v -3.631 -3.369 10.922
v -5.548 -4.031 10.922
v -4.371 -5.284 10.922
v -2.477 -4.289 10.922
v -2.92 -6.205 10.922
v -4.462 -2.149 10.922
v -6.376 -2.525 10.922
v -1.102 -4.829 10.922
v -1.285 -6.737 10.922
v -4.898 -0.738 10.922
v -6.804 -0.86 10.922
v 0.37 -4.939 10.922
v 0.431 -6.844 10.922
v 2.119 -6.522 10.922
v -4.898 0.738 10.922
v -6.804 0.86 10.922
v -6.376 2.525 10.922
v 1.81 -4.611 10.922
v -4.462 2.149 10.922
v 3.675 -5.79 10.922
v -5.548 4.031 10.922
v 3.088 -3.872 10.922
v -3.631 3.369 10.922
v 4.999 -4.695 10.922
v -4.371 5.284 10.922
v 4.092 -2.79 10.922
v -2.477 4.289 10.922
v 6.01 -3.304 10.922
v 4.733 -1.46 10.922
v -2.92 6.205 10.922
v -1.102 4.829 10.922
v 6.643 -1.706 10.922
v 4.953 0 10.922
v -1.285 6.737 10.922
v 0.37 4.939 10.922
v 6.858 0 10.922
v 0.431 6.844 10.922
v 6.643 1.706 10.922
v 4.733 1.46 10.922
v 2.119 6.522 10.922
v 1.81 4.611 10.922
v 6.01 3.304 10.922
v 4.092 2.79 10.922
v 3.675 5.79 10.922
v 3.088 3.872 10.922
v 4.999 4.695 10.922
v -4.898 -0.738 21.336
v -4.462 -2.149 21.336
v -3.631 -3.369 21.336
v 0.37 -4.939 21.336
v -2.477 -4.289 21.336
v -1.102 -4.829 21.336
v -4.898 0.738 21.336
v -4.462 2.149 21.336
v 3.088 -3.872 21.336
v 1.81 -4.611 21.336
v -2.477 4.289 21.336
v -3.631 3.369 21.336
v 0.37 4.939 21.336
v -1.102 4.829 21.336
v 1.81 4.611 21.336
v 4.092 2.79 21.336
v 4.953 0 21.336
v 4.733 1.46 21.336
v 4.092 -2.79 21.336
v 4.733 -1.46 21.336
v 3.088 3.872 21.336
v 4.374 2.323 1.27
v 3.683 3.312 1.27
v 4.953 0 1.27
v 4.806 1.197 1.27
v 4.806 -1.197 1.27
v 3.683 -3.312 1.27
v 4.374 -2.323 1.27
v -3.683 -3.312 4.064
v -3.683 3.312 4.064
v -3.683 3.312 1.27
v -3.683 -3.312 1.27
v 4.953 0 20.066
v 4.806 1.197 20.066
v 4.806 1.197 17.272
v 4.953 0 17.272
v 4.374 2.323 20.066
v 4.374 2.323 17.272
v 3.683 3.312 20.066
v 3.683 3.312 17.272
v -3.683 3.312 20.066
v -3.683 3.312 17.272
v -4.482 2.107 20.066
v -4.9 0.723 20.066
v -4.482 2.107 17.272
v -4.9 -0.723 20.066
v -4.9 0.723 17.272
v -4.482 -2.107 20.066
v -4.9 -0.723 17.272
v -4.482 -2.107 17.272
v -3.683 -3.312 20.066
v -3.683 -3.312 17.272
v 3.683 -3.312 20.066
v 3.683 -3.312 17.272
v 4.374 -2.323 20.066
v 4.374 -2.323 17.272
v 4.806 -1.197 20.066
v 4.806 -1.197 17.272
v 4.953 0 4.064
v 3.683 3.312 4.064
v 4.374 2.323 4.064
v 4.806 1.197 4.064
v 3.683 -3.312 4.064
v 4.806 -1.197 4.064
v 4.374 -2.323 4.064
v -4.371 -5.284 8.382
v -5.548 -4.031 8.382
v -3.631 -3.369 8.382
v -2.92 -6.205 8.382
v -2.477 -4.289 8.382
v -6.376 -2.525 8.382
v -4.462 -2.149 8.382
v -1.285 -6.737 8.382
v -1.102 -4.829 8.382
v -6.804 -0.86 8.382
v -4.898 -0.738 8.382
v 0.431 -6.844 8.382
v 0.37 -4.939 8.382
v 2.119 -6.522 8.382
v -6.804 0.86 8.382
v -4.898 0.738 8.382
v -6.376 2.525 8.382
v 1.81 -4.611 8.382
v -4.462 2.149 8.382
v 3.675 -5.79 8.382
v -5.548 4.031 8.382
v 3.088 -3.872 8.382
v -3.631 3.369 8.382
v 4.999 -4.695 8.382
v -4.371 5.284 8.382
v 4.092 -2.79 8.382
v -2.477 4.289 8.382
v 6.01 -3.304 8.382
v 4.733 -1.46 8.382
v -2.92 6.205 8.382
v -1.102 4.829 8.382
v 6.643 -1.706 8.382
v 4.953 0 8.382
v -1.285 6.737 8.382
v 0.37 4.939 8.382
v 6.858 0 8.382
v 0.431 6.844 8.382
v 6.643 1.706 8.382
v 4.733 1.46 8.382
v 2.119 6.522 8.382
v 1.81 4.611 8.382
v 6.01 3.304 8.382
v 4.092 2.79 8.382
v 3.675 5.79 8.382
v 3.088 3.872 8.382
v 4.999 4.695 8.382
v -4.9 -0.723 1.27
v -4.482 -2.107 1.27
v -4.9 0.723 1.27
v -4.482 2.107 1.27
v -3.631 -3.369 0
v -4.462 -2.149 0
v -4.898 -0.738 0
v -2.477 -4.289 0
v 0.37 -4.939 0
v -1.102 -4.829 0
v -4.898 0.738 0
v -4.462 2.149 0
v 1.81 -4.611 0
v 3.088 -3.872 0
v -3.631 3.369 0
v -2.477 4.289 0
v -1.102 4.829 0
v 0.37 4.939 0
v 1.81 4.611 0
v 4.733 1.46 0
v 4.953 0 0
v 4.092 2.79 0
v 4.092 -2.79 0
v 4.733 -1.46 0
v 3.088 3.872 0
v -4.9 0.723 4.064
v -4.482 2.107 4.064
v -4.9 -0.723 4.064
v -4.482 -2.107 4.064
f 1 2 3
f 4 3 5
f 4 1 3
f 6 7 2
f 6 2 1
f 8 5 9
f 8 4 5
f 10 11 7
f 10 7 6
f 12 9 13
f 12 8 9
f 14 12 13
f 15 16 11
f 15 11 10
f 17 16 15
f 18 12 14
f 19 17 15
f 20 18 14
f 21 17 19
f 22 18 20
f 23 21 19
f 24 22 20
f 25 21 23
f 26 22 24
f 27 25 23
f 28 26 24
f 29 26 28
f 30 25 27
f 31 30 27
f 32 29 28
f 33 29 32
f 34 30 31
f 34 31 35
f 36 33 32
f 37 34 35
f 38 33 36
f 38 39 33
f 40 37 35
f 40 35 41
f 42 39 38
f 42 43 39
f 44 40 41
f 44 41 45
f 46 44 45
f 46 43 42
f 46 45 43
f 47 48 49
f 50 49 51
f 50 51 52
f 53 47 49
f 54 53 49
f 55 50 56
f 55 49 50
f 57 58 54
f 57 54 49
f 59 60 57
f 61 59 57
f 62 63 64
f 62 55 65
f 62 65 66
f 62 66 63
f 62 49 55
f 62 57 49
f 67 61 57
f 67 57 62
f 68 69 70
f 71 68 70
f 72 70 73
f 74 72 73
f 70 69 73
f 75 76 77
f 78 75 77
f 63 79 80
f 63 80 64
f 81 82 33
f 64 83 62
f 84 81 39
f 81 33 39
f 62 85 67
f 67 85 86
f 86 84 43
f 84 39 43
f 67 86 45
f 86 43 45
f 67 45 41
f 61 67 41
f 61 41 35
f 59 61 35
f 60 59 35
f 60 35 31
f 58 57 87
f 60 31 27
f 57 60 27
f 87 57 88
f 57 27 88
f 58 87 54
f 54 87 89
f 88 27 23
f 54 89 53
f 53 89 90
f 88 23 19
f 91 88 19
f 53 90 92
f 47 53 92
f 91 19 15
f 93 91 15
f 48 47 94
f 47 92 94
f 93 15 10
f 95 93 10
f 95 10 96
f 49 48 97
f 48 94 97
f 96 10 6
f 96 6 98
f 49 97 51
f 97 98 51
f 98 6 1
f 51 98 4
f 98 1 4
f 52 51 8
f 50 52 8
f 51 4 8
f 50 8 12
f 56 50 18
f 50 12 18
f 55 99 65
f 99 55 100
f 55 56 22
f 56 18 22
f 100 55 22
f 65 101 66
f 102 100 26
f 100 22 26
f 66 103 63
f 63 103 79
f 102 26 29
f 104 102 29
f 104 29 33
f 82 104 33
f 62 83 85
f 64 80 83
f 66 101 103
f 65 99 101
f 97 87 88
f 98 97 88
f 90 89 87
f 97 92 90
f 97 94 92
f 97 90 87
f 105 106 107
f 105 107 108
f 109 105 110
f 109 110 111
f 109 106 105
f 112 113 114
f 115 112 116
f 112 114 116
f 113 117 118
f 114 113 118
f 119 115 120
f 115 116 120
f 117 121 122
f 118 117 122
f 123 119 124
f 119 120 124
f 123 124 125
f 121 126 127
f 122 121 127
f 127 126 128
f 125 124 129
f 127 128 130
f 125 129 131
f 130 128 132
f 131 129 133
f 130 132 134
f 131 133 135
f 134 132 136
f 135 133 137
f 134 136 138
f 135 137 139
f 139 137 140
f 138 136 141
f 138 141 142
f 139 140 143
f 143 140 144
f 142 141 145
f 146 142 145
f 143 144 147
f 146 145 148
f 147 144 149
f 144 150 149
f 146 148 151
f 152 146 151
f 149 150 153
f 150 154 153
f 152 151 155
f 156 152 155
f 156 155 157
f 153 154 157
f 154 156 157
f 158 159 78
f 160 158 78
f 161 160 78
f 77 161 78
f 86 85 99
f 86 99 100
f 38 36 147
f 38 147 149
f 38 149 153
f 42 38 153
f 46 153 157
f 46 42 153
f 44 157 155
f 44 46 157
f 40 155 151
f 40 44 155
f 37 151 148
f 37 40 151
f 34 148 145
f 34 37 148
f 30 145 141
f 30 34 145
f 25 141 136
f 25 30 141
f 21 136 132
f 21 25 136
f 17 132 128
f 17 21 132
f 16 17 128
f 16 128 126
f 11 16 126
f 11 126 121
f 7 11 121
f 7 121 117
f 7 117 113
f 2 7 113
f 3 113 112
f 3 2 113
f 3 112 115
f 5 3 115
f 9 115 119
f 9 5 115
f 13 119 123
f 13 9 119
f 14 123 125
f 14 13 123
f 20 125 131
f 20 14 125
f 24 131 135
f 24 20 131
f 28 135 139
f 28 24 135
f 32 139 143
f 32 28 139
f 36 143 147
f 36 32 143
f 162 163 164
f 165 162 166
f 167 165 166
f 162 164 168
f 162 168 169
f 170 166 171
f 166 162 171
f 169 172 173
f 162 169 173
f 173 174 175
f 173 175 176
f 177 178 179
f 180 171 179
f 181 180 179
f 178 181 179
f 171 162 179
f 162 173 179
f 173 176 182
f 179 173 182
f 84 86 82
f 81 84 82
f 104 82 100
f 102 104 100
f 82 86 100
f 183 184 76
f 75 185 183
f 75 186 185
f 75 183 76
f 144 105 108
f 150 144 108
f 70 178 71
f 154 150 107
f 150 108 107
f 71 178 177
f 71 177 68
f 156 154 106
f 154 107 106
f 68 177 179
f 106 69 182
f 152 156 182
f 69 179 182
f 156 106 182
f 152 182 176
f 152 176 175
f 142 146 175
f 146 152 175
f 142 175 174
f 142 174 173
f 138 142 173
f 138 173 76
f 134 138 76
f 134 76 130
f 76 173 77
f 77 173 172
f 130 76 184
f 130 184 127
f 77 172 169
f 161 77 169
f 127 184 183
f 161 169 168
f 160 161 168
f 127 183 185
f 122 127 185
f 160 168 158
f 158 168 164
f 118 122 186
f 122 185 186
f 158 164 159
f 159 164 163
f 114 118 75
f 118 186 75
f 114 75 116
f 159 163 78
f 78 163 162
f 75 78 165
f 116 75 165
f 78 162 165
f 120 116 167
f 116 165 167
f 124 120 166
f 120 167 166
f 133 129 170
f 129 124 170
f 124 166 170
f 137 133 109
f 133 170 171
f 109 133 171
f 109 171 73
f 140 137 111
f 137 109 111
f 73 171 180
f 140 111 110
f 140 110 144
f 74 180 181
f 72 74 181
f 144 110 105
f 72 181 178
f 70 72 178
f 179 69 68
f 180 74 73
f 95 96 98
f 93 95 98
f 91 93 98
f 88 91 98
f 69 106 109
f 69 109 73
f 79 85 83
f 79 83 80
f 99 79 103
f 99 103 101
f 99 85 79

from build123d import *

# Parameters (mm, degrees)
SKETCH1_R               = 4.953
BOSS_EXTRUDE1_DEPTH     = 21.336
BOSS_EXTRUDE2_START     = -10.414
SKETCH2_R               = 6.858
BOSS_EXTRUDE2_DEPTH     = 2.54
CUT_EXTRUDE1_DEPTH      = 24.436920105
CUT_EXTRUDE1_DEPTH_BACK = 24.436920105
SKETCH3_W               = 1.27
SKETCH3_H               = 2.794
CUT_EXTRUDE2_DEPTH      = 24.436920105
CUT_EXTRUDE2_DEPTH_BACK = 24.436920105
SKETCH4_W               = 1.27
SKETCH4_H               = 2.794


with BuildPart() as part:
    # Sketch1 → Boss-Extrude1 (new body)
    with BuildSketch(Plane.XY):
        Circle(SKETCH1_R)
    extrude(amount=BOSS_EXTRUDE1_DEPTH)

    # Sketch2 → Boss-Extrude2 (add)
    with BuildSketch(Plane.XY.offset(21.336).offset(BOSS_EXTRUDE2_START)):
        Circle(SKETCH2_R)
    extrude(amount=-BOSS_EXTRUDE2_DEPTH)

    # Sketch3 → Cut-Extrude1 (cut, two sides: drawn at the far end of the back side and taken through both)
    with BuildSketch(Plane(origin=(0, 0, 0), x_dir=(1, 0, 0), z_dir=(0, 1, 0)).offset(-CUT_EXTRUDE1_DEPTH_BACK)):
        with Locations((4.318, -2.667)):
            Rectangle(SKETCH3_W, SKETCH3_H)
        with Locations((-4.318, -2.667)):
            Rectangle(SKETCH3_W, SKETCH3_H)
    extrude(amount=CUT_EXTRUDE1_DEPTH + CUT_EXTRUDE1_DEPTH_BACK, mode=Mode.SUBTRACT)

    # Sketch4 → Cut-Extrude2 (cut, two sides: drawn at the far end of the back side and taken through both)
    with BuildSketch(Plane(origin=(0, 0, 0), x_dir=(1, 0, 0), z_dir=(0, 1, 0)).offset(-CUT_EXTRUDE2_DEPTH_BACK)):
        with Locations((4.318, -18.669)):
            Rectangle(SKETCH4_W, SKETCH4_H)
        with Locations((-4.318, -18.669)):
            Rectangle(SKETCH4_W, SKETCH4_H)
    extrude(amount=CUT_EXTRUDE2_DEPTH + CUT_EXTRUDE2_DEPTH_BACK, mode=Mode.SUBTRACT)


solid = part.part
